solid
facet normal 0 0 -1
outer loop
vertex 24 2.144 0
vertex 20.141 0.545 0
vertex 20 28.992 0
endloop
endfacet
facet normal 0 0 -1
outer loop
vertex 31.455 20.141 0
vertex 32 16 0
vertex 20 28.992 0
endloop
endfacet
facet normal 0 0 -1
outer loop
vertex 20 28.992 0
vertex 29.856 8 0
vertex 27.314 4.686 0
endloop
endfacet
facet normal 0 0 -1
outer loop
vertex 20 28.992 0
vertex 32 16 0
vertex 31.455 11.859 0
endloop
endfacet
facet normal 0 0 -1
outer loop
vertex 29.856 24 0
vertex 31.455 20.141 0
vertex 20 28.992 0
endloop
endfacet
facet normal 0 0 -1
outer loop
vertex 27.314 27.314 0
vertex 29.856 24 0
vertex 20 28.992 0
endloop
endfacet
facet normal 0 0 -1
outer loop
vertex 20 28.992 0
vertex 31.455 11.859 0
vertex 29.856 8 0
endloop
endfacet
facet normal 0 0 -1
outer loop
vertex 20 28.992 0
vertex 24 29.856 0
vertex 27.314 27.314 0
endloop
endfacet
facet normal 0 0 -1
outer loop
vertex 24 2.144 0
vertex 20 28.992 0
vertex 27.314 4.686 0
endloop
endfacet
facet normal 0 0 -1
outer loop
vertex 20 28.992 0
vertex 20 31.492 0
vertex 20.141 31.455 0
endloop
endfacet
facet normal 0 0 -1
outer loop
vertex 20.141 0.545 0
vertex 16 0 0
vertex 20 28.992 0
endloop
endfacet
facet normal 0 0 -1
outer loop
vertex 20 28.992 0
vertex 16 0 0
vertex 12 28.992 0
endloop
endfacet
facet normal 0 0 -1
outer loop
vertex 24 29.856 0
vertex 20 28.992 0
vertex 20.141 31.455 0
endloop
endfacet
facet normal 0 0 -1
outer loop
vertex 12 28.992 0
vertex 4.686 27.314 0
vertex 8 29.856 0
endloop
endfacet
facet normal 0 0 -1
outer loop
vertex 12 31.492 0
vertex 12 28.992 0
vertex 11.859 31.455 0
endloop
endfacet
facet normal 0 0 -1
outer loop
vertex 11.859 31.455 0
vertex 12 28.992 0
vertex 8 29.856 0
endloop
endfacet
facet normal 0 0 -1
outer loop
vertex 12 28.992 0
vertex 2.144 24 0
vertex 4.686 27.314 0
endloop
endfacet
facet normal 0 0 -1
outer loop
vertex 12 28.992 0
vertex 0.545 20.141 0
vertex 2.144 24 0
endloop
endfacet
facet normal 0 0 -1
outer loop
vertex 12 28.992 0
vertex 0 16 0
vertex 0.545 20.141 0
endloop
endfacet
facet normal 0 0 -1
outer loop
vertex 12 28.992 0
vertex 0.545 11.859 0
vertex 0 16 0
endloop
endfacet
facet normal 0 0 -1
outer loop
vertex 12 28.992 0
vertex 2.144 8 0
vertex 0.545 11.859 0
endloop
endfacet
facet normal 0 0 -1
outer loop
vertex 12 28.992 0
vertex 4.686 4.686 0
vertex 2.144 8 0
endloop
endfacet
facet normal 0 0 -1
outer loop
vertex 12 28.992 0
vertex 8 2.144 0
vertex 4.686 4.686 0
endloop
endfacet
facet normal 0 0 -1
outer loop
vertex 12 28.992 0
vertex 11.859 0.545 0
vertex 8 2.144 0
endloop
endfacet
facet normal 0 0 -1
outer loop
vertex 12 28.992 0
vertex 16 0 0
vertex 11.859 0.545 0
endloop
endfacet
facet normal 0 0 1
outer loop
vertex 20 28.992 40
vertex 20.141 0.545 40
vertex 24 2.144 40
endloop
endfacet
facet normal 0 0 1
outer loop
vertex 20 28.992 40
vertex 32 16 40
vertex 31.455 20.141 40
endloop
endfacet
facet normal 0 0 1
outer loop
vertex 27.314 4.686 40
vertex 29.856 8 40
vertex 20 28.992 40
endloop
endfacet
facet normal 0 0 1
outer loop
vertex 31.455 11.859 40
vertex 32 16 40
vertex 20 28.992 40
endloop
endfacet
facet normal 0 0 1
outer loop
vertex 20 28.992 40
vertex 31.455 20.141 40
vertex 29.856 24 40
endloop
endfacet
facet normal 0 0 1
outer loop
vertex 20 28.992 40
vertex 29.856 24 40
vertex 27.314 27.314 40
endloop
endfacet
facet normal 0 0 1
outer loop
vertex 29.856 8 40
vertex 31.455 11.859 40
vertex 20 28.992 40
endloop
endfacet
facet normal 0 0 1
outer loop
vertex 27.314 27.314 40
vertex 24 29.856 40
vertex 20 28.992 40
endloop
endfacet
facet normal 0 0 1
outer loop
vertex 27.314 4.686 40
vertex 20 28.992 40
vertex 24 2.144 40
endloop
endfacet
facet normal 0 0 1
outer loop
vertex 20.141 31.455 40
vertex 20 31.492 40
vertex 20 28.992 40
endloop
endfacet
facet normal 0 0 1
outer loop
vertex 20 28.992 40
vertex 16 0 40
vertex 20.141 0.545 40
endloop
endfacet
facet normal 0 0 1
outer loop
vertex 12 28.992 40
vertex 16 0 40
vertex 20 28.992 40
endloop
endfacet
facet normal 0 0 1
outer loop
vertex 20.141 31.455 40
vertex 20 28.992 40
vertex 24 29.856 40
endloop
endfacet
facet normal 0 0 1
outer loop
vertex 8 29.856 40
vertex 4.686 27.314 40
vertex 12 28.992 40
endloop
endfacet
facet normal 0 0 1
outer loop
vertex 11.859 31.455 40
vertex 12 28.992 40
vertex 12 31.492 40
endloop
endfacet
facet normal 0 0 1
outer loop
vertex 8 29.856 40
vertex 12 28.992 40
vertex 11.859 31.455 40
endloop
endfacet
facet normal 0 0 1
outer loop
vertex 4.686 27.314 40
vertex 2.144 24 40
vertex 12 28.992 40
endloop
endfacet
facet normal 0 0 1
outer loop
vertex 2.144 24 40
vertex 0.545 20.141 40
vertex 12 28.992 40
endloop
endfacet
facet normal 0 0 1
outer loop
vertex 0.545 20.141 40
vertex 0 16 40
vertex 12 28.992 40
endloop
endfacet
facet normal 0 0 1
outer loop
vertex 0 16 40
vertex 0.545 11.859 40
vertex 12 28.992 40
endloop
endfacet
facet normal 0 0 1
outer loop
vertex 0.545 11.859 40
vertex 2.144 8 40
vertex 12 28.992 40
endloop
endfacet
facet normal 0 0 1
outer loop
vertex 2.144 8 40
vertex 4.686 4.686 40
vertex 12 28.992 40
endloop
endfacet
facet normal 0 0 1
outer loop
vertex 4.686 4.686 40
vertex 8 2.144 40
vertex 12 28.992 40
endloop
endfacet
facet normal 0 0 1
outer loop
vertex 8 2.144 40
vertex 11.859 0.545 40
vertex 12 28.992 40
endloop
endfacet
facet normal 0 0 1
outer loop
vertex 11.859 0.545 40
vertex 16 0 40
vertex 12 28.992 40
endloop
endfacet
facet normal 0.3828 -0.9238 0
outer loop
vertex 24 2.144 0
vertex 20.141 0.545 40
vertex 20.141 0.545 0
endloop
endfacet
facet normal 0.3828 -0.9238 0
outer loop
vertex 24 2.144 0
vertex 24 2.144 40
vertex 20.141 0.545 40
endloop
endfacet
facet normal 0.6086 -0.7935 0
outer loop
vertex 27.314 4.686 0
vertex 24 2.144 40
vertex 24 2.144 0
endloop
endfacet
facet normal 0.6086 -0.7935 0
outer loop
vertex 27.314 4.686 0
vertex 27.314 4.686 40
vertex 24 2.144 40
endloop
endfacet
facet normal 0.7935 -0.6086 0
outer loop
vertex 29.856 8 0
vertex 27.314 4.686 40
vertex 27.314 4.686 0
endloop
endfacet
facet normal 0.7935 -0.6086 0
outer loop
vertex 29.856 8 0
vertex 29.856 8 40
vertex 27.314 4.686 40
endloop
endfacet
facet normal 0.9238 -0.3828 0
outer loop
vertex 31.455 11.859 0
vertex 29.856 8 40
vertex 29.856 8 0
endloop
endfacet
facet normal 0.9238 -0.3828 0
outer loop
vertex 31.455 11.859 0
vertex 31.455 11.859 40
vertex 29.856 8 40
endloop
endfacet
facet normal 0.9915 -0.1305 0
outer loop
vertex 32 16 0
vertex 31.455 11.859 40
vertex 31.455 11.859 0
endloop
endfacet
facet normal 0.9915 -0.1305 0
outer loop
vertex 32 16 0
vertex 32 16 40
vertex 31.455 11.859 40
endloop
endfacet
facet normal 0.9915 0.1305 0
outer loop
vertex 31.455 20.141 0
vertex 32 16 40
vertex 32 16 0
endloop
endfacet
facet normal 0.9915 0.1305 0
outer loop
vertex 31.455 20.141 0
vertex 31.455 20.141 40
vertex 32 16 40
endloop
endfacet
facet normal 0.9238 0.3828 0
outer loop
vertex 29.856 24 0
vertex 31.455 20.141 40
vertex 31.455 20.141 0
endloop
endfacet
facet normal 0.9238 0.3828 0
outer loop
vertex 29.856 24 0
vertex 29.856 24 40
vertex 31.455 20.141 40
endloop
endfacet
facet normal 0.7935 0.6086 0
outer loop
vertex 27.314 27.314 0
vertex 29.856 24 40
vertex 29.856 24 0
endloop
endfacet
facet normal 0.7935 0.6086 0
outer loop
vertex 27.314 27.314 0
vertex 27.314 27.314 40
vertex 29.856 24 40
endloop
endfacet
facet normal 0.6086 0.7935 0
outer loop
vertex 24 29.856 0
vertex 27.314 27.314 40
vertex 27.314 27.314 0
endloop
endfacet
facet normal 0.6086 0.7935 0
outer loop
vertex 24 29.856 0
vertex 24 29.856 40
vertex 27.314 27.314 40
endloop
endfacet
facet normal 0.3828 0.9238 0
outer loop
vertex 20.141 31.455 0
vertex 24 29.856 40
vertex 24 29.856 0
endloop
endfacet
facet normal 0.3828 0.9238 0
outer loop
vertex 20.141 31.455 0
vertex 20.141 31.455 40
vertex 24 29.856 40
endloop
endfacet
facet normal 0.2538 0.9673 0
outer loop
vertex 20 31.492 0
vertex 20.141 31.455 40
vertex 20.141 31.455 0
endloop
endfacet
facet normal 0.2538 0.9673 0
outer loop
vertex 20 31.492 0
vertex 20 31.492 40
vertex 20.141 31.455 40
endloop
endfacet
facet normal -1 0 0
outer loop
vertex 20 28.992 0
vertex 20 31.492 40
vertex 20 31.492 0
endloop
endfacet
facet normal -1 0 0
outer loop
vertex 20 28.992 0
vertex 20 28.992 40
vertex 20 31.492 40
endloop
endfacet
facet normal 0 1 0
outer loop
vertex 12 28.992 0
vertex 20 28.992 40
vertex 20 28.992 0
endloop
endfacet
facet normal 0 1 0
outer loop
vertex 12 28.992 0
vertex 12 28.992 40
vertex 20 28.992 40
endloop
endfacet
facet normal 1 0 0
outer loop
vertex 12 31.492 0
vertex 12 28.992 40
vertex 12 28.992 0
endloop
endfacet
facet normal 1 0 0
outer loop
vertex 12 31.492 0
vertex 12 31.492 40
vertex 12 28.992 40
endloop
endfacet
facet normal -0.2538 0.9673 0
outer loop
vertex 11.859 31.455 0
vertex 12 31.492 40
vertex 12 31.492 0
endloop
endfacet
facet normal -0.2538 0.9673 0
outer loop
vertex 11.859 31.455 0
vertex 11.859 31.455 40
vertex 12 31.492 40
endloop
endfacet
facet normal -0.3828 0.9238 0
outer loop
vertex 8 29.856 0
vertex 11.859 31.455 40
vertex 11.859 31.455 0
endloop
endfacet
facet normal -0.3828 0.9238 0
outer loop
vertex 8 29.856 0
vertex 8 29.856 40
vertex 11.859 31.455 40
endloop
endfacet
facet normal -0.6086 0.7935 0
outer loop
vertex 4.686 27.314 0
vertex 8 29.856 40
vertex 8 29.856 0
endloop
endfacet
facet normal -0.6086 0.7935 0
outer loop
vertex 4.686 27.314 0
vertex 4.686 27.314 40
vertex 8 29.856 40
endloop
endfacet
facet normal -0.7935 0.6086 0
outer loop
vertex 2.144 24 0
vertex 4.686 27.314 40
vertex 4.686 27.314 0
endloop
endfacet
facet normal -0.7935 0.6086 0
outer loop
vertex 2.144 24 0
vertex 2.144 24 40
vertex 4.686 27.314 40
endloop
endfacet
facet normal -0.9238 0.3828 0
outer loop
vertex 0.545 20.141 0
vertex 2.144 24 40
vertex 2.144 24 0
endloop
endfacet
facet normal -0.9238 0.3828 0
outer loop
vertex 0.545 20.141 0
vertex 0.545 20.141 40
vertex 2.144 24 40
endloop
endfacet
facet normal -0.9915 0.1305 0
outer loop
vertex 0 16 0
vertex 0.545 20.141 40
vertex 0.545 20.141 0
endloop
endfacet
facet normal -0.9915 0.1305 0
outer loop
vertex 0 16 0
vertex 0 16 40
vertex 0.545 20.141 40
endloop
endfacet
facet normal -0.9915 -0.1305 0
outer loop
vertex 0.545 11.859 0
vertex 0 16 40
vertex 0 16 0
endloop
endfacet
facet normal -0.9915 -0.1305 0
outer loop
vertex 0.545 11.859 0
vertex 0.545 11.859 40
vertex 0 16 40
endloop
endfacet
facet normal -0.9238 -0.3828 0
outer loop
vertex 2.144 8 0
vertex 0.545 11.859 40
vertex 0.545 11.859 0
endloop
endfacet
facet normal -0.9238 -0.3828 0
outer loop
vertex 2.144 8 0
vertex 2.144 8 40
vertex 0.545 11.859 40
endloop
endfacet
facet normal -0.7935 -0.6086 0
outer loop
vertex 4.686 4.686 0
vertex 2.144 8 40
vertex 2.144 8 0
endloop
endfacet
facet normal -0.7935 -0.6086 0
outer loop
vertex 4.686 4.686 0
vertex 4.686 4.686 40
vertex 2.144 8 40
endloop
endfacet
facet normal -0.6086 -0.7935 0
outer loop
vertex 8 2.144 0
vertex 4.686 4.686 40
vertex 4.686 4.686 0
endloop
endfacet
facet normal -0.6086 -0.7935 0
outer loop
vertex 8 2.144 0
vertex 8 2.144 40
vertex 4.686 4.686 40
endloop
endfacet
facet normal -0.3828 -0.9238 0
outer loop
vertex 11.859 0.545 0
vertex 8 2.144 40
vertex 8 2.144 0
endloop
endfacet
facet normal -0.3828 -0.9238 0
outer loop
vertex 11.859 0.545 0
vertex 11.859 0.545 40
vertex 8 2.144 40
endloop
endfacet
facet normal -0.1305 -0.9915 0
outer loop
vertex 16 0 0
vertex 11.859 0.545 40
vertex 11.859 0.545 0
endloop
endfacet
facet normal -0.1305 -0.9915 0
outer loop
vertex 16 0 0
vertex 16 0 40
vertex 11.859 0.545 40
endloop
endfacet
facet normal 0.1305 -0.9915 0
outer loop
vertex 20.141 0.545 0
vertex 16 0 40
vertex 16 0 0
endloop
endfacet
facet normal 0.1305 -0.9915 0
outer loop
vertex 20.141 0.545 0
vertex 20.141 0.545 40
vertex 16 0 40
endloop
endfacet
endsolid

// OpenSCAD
$fn = 32;

// ----------------------------------------------------------------------
// Keyway shaft: d32 shaft, key 8 x 2.5 mm
// ----------------------------------------------------------------------

// --- parameters (mm) ---
shaft_r = 16;             // shaft radius
key_w = 8;                // keyway width
key_d = 2.5;              // keyway depth below the surface line
plate_t = 40;             // shaft length, Z (extrusion height)

shaft_d = 2 * shaft_r;  // shaft diameter
circle_step = 15;  // polygon sampling step, degrees

profile = [[11.859, 31.455], [8, 29.856], [4.686, 27.314], [2.144, 24], [0.545, 20.141], [0, 16], [0.545, 11.859], [2.144, 8], [4.686, 4.686], [8, 2.144], [11.859, 0.545], [16, 0], [20.141, 0.545], [24, 2.144], [27.314, 4.686], [29.856, 8], [31.455, 11.859], [32, 16], [31.455, 20.141], [29.856, 24], [27.314, 27.314], [24, 29.856], [20.141, 31.455], [20, 31.492], [20, 28.992], [12, 28.992], [12, 31.492]];  // primary outline, 27 points, counter clockwise

// --- the one profile operation ---
linear_extrude(height = plate_t) polygon(points = profile);
